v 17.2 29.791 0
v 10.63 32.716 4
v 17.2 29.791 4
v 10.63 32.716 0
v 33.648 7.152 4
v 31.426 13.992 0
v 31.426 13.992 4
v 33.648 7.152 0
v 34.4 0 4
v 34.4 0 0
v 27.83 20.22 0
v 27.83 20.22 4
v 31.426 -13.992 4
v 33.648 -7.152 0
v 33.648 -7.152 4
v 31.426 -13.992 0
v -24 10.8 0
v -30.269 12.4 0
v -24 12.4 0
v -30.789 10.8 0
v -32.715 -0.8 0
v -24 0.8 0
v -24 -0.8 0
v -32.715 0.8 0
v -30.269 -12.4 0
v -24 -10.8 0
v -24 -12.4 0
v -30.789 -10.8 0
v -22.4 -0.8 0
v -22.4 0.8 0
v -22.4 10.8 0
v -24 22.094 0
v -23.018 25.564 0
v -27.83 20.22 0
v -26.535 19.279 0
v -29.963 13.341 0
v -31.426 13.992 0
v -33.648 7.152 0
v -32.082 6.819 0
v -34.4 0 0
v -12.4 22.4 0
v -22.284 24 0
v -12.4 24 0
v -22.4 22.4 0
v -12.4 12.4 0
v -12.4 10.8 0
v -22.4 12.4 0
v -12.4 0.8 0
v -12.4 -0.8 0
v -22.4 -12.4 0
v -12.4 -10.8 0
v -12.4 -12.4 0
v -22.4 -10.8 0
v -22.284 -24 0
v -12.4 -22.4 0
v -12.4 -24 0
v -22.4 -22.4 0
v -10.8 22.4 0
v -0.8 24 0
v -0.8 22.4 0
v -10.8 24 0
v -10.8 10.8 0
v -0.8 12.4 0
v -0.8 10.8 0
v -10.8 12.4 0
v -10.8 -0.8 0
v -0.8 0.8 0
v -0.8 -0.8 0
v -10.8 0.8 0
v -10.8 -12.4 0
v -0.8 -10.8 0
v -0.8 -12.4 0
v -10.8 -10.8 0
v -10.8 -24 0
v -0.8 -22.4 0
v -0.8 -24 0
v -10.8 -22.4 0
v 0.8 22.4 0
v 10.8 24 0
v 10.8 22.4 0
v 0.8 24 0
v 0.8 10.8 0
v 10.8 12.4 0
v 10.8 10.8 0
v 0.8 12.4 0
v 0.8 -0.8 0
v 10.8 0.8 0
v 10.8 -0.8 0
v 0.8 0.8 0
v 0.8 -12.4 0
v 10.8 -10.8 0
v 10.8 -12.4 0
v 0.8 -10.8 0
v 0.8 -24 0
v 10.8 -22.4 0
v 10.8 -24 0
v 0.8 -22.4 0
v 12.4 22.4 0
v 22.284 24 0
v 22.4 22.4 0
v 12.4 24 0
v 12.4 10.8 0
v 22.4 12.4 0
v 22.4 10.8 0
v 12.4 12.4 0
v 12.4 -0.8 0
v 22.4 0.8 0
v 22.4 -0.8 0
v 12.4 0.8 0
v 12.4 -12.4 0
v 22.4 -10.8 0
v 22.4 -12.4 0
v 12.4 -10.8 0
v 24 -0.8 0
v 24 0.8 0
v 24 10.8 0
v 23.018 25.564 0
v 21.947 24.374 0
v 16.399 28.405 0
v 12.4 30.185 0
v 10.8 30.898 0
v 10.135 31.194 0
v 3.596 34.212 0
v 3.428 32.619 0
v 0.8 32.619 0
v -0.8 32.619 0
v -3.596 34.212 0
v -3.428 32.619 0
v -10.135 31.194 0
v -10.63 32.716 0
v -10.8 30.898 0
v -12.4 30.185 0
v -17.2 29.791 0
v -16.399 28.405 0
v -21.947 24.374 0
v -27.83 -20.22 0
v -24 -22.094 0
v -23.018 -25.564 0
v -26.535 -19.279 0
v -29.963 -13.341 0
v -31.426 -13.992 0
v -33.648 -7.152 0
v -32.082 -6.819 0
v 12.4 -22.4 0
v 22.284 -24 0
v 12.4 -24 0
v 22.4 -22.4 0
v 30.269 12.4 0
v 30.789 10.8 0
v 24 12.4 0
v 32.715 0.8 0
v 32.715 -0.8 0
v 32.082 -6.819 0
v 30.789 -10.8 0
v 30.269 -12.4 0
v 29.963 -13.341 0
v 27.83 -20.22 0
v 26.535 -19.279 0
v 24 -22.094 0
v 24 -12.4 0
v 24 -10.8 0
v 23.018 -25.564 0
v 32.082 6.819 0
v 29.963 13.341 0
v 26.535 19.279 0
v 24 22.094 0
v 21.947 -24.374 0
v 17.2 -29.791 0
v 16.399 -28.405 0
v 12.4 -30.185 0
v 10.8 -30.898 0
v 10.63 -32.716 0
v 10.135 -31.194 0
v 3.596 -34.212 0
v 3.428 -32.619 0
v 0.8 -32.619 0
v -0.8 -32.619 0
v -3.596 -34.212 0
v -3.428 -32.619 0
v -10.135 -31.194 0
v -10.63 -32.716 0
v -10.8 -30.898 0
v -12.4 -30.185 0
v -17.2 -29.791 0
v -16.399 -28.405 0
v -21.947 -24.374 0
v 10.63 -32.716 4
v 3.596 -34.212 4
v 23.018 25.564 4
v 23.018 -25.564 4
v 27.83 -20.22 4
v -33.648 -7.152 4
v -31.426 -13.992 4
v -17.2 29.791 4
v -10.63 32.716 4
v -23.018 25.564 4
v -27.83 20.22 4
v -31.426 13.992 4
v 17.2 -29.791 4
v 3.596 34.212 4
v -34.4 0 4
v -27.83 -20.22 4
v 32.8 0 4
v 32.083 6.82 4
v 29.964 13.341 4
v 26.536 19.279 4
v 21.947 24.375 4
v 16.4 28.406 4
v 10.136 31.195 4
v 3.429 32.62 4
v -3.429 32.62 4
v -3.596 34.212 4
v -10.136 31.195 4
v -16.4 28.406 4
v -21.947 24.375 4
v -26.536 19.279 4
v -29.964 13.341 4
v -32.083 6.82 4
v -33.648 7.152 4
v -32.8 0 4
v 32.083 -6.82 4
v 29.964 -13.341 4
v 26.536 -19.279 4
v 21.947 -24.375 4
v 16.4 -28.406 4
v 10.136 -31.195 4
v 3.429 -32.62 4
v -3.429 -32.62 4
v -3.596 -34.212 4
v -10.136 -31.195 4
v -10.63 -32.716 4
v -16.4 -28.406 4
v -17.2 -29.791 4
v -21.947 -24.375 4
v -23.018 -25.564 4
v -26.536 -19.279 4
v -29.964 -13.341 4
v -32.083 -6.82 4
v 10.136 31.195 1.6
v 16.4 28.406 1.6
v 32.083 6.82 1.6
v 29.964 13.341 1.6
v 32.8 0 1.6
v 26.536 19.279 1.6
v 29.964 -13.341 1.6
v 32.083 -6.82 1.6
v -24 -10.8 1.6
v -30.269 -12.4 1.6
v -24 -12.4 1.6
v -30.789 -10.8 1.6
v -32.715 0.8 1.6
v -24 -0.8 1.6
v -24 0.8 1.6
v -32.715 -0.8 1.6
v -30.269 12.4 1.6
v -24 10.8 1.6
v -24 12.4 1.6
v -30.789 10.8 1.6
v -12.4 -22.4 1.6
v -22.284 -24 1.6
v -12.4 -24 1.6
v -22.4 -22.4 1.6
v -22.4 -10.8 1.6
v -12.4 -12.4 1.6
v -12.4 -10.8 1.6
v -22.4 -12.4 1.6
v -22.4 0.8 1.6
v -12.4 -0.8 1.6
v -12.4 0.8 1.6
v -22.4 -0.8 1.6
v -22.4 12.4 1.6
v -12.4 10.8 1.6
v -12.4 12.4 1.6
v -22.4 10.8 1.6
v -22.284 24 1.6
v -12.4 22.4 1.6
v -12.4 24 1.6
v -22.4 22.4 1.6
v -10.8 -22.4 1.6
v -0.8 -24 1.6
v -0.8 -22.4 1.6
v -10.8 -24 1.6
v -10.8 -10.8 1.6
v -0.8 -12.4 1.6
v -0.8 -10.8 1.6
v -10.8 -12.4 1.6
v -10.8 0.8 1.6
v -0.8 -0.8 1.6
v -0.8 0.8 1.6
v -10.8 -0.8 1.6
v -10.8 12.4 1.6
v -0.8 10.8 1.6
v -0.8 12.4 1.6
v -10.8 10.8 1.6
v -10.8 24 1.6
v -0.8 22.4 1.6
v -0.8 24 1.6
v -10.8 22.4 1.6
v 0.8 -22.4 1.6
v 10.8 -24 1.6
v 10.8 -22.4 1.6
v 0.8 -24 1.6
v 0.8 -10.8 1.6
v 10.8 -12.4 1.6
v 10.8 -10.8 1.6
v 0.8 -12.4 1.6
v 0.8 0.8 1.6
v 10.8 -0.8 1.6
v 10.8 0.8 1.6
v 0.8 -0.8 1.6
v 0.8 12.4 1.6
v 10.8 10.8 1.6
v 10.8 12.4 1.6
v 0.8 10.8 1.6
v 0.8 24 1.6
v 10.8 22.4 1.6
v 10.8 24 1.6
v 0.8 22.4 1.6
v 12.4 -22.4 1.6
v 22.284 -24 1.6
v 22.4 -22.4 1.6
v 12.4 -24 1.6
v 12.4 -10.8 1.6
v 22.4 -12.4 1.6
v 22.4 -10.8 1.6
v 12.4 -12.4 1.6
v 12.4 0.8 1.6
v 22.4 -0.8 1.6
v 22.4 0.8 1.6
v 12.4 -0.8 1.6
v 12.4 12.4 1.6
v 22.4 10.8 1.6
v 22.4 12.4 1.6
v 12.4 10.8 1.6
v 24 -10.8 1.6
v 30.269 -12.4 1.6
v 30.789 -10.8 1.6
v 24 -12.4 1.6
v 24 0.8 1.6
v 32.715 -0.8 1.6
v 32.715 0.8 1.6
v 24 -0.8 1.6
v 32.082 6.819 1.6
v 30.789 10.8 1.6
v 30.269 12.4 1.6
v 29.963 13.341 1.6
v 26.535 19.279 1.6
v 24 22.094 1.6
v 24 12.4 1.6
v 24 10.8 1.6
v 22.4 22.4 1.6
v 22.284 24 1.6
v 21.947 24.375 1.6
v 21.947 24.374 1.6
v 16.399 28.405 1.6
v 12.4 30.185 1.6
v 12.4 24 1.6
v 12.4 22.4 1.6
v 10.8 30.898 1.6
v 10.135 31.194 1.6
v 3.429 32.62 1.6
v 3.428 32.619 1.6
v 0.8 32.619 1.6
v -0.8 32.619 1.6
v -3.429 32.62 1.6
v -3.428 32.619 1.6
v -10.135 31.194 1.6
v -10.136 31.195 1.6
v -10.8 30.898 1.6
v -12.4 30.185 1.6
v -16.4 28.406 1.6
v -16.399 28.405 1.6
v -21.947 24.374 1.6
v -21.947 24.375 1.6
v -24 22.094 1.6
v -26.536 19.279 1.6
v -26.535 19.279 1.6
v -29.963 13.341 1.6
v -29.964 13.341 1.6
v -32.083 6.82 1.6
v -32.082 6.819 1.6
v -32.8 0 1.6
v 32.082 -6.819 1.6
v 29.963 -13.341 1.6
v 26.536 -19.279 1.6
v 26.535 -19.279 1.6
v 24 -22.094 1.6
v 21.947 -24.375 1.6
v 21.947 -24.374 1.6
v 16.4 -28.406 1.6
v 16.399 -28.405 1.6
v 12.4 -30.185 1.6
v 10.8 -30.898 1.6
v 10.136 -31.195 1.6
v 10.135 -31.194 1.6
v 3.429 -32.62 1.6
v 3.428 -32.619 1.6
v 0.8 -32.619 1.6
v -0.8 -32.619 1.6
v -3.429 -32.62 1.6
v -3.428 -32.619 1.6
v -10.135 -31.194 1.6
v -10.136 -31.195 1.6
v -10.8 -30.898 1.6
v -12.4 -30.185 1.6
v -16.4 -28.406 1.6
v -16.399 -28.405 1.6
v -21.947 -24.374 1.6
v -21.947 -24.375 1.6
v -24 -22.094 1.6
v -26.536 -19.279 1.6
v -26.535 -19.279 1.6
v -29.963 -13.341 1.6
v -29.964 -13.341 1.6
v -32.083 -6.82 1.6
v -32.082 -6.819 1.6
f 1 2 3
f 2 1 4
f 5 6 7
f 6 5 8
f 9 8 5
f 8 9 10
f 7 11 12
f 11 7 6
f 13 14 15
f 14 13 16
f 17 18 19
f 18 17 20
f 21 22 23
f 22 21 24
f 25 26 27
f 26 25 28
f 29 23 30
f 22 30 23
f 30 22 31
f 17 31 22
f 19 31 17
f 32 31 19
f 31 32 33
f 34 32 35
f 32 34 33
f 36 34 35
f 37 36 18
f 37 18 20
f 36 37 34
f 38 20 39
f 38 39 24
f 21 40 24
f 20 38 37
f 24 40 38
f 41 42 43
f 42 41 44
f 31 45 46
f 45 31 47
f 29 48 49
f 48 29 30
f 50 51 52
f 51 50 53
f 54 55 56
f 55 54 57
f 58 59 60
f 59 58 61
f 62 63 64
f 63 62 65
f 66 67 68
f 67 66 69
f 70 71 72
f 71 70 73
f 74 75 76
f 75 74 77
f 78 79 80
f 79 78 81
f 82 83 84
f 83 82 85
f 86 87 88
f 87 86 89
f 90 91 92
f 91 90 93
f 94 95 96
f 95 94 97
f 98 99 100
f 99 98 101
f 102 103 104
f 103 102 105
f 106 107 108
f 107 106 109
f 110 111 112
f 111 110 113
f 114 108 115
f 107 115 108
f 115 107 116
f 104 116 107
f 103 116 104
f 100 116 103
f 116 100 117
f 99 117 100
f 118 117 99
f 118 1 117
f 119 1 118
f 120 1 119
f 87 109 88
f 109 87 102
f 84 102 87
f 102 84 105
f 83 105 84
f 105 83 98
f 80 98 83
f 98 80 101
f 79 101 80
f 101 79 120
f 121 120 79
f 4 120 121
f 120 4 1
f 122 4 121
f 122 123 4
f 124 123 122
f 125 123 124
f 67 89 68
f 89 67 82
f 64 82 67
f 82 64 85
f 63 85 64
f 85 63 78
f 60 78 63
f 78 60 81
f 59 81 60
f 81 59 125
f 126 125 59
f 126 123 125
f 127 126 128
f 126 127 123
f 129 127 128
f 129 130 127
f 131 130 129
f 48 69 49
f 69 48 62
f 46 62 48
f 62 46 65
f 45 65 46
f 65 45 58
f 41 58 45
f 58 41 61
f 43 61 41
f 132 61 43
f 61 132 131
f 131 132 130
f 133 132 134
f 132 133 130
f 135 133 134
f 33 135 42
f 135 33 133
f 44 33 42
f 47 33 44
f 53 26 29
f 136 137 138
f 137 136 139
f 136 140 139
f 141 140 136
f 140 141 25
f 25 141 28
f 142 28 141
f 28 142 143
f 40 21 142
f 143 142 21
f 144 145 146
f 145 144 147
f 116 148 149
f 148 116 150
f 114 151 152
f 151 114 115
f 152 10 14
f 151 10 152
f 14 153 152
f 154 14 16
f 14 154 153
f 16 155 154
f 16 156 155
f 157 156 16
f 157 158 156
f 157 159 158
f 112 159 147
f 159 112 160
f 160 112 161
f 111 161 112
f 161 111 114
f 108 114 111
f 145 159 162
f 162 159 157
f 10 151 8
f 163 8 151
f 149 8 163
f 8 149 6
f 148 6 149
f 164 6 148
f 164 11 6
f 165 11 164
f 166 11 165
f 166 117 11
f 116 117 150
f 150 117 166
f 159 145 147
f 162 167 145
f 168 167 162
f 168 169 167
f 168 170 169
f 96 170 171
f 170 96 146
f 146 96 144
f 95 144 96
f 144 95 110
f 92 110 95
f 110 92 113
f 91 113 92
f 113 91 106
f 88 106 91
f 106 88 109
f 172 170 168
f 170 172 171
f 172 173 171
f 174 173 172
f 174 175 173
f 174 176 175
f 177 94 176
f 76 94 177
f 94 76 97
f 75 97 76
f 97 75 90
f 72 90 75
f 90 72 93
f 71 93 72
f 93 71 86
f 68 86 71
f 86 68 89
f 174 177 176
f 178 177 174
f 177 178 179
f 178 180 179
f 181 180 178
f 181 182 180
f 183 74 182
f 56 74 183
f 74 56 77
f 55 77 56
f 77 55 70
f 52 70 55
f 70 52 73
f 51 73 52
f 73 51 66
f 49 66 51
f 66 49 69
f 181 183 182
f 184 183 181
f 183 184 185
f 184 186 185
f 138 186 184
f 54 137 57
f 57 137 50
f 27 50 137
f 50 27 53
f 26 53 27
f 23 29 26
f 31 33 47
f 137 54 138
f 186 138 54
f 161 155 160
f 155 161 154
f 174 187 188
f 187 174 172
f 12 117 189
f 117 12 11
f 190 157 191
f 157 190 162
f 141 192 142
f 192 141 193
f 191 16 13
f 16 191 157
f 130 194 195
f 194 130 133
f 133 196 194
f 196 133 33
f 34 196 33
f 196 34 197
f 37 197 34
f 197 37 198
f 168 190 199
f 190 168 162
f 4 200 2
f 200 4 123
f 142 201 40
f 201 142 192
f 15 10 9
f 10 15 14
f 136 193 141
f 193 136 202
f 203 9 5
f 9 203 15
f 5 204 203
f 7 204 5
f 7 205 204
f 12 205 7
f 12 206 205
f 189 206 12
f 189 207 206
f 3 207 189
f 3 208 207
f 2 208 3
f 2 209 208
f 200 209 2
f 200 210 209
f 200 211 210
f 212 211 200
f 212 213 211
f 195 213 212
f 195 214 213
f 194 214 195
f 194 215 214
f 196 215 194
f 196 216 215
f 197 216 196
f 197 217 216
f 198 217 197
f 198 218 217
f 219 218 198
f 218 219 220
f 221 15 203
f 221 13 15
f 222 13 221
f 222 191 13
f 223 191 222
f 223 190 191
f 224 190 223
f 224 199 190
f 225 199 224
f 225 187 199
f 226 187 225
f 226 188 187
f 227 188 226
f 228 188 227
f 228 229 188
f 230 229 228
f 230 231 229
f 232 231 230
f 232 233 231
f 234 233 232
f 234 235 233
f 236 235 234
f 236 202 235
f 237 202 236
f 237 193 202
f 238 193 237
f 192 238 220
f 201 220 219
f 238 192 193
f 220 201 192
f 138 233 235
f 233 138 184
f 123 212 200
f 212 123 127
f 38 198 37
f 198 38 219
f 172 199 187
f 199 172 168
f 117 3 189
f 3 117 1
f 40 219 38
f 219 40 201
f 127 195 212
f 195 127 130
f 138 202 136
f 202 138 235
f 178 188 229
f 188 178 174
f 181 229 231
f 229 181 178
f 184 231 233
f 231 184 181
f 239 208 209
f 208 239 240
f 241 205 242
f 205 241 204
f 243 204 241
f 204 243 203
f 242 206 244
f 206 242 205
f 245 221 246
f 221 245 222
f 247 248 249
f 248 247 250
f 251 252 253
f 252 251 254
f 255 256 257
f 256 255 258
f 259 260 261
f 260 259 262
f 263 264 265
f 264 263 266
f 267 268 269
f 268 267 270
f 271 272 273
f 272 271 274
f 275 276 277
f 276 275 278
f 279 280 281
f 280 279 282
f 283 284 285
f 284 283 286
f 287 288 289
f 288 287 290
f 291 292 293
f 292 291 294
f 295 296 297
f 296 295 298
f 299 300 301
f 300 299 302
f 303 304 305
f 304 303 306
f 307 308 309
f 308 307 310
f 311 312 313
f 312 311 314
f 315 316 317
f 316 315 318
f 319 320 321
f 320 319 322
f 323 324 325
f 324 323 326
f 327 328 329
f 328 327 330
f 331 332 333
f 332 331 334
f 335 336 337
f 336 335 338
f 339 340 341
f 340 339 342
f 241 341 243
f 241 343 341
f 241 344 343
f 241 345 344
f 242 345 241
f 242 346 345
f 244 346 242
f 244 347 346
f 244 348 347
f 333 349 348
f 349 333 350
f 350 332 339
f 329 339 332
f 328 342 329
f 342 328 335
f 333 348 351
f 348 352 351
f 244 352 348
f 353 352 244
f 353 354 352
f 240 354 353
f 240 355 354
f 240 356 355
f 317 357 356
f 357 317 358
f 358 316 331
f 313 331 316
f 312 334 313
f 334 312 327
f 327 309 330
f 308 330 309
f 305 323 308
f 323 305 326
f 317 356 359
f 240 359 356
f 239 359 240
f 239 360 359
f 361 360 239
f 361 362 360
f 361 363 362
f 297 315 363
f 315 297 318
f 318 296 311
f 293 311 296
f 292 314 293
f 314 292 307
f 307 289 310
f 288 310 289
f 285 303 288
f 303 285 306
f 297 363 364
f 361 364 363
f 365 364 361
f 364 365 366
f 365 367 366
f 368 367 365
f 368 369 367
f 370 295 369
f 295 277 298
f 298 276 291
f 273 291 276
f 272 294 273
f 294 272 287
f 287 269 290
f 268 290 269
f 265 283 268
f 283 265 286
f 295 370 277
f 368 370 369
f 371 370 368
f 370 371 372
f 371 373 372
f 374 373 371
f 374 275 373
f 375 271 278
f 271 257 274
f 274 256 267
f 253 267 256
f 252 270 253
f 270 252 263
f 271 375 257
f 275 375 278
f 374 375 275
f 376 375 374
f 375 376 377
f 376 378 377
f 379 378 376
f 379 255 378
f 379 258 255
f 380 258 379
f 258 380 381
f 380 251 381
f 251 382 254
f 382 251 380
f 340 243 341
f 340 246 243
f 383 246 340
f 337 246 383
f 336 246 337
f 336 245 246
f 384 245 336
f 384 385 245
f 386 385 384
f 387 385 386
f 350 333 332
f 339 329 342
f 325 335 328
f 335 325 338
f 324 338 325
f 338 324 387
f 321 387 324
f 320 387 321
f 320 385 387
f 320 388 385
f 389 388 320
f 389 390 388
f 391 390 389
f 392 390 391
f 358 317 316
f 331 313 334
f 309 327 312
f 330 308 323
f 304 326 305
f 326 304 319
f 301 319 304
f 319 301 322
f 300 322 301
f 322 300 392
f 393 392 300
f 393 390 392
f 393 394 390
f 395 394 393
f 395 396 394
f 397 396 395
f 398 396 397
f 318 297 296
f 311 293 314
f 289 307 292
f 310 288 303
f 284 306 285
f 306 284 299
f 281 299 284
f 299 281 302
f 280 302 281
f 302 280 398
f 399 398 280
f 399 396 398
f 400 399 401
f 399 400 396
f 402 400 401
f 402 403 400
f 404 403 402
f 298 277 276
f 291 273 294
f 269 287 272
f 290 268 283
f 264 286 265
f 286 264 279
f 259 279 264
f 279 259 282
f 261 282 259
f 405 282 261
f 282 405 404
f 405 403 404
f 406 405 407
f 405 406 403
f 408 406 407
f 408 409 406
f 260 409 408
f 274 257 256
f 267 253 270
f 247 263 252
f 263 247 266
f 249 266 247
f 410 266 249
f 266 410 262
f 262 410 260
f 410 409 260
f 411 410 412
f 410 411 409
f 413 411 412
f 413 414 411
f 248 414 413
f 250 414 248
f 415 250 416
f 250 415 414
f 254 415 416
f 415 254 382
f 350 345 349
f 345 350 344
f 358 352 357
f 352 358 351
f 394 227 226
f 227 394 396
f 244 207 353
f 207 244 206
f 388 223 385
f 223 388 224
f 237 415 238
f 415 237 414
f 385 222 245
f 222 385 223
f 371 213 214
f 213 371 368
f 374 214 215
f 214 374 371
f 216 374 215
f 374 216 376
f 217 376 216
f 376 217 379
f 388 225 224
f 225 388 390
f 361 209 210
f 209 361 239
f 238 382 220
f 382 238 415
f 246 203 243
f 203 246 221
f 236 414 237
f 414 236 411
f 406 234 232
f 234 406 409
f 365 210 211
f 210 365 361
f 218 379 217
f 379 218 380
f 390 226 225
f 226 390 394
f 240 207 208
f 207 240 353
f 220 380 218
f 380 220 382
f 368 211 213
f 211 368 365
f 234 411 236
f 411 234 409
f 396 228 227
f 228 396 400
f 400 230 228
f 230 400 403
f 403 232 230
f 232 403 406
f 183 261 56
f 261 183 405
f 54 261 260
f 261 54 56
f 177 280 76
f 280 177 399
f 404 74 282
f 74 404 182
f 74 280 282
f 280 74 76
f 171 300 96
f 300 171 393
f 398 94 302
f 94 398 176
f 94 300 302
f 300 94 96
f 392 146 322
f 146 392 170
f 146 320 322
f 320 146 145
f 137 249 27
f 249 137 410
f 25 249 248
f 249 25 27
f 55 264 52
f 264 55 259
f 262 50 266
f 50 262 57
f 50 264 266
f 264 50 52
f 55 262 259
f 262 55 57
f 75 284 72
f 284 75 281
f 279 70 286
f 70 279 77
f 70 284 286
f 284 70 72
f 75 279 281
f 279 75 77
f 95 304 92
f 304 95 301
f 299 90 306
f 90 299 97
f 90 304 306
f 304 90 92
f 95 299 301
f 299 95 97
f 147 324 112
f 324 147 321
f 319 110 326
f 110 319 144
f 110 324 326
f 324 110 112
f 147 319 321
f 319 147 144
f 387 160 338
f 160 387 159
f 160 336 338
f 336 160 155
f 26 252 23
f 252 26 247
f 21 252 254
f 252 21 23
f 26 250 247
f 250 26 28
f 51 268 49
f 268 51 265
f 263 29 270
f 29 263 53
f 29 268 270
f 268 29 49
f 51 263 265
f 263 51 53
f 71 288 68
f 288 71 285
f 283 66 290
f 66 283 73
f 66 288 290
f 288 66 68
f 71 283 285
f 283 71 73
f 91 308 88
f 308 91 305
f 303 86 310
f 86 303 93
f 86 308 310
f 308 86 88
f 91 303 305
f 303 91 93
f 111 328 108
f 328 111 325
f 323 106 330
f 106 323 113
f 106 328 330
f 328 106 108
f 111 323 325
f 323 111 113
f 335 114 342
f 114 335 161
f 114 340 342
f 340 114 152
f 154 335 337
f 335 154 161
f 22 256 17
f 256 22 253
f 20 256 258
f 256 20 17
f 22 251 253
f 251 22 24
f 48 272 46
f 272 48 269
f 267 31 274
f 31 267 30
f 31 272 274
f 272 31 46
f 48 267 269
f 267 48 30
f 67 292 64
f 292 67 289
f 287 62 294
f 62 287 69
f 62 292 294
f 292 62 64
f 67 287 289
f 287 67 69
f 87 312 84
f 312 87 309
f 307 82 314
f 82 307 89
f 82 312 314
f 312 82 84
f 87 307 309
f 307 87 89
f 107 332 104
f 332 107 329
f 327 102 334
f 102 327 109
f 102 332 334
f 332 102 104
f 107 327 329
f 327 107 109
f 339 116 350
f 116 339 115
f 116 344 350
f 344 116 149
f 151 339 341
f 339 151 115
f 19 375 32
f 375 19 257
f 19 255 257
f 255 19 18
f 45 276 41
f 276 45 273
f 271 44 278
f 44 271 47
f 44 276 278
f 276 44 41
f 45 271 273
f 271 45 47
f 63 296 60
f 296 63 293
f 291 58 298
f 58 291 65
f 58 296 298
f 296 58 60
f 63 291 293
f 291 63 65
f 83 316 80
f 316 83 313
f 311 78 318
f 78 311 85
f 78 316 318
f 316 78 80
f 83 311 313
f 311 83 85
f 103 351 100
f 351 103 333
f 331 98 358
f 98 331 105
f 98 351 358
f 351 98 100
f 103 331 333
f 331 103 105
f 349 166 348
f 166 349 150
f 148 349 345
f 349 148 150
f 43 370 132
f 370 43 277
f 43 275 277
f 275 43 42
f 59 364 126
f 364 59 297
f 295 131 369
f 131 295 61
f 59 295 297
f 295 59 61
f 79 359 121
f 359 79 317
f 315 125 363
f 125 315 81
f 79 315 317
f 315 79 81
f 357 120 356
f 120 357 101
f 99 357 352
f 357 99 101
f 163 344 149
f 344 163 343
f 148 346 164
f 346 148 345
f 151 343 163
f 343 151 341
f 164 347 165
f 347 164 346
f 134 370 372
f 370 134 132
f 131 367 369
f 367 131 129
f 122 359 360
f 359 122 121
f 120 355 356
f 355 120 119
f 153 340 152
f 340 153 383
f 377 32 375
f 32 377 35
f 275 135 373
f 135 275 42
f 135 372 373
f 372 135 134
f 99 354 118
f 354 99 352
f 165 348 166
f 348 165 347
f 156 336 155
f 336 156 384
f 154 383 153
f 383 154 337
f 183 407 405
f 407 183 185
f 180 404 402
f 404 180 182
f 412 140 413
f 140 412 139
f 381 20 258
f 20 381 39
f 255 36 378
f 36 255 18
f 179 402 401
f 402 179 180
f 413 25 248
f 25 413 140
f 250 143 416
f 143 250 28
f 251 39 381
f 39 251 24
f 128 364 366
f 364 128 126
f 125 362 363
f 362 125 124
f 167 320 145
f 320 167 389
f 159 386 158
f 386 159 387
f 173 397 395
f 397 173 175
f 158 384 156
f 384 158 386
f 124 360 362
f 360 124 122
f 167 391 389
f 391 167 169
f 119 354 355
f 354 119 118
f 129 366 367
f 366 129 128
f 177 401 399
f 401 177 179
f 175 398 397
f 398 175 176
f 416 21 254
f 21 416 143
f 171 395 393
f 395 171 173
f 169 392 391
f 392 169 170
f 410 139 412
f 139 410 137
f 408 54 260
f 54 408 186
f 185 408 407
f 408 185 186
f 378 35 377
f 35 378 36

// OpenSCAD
// file: modules.scad
module petri_dish(h, inner_r, thickness) {
    difference() {
        cylinder(h = h, r = inner_r + thickness);
        translate([0, 0, thickness]) {
            cylinder(h = h, r = inner_r);
        }
    }
}
// file: constants.scad
// 3Dプリンタ特性
thickness = 1.6;
margin = 0.6;
thin = 0.001; // boolean演算の境界面を重ねないための微小値

// 対象特性
tray_inner_radius = 35;
tray_height = 10;
drainer_height = 4;
drainer_hole_size = 10;
// main file
include <constants.scad>;
include <modules.scad>;

inner_radius = tray_inner_radius - margin - thickness;

module base() {
    petri_dish(drainer_height, inner_radius, thickness);
}

module hole() {
    module base() {
        interval = drainer_hole_size + thickness;
        repeat = 6;
        size = drainer_hole_size * repeat + thickness * (repeat - 1);

        translate([-size / 2, -size / 2, 0]) {
            for (i = [0 : repeat - 1]) {
                for (j = [0 : repeat - 1]) {
                    translate([j * interval, i * interval, 0]) {
                        cube(drainer_hole_size);
                    }
                }
            }
        }
    }

    module mask() {
        translate([0, 0, -5]) {
            cylinder(r = inner_radius - thin, h = drainer_hole_size + 10);
        }
    }

    translate([0, 0, -thin]) {
        intersection() {
            base();
            mask();
        }
    }
}

difference() {
    base();
    hole();
}
